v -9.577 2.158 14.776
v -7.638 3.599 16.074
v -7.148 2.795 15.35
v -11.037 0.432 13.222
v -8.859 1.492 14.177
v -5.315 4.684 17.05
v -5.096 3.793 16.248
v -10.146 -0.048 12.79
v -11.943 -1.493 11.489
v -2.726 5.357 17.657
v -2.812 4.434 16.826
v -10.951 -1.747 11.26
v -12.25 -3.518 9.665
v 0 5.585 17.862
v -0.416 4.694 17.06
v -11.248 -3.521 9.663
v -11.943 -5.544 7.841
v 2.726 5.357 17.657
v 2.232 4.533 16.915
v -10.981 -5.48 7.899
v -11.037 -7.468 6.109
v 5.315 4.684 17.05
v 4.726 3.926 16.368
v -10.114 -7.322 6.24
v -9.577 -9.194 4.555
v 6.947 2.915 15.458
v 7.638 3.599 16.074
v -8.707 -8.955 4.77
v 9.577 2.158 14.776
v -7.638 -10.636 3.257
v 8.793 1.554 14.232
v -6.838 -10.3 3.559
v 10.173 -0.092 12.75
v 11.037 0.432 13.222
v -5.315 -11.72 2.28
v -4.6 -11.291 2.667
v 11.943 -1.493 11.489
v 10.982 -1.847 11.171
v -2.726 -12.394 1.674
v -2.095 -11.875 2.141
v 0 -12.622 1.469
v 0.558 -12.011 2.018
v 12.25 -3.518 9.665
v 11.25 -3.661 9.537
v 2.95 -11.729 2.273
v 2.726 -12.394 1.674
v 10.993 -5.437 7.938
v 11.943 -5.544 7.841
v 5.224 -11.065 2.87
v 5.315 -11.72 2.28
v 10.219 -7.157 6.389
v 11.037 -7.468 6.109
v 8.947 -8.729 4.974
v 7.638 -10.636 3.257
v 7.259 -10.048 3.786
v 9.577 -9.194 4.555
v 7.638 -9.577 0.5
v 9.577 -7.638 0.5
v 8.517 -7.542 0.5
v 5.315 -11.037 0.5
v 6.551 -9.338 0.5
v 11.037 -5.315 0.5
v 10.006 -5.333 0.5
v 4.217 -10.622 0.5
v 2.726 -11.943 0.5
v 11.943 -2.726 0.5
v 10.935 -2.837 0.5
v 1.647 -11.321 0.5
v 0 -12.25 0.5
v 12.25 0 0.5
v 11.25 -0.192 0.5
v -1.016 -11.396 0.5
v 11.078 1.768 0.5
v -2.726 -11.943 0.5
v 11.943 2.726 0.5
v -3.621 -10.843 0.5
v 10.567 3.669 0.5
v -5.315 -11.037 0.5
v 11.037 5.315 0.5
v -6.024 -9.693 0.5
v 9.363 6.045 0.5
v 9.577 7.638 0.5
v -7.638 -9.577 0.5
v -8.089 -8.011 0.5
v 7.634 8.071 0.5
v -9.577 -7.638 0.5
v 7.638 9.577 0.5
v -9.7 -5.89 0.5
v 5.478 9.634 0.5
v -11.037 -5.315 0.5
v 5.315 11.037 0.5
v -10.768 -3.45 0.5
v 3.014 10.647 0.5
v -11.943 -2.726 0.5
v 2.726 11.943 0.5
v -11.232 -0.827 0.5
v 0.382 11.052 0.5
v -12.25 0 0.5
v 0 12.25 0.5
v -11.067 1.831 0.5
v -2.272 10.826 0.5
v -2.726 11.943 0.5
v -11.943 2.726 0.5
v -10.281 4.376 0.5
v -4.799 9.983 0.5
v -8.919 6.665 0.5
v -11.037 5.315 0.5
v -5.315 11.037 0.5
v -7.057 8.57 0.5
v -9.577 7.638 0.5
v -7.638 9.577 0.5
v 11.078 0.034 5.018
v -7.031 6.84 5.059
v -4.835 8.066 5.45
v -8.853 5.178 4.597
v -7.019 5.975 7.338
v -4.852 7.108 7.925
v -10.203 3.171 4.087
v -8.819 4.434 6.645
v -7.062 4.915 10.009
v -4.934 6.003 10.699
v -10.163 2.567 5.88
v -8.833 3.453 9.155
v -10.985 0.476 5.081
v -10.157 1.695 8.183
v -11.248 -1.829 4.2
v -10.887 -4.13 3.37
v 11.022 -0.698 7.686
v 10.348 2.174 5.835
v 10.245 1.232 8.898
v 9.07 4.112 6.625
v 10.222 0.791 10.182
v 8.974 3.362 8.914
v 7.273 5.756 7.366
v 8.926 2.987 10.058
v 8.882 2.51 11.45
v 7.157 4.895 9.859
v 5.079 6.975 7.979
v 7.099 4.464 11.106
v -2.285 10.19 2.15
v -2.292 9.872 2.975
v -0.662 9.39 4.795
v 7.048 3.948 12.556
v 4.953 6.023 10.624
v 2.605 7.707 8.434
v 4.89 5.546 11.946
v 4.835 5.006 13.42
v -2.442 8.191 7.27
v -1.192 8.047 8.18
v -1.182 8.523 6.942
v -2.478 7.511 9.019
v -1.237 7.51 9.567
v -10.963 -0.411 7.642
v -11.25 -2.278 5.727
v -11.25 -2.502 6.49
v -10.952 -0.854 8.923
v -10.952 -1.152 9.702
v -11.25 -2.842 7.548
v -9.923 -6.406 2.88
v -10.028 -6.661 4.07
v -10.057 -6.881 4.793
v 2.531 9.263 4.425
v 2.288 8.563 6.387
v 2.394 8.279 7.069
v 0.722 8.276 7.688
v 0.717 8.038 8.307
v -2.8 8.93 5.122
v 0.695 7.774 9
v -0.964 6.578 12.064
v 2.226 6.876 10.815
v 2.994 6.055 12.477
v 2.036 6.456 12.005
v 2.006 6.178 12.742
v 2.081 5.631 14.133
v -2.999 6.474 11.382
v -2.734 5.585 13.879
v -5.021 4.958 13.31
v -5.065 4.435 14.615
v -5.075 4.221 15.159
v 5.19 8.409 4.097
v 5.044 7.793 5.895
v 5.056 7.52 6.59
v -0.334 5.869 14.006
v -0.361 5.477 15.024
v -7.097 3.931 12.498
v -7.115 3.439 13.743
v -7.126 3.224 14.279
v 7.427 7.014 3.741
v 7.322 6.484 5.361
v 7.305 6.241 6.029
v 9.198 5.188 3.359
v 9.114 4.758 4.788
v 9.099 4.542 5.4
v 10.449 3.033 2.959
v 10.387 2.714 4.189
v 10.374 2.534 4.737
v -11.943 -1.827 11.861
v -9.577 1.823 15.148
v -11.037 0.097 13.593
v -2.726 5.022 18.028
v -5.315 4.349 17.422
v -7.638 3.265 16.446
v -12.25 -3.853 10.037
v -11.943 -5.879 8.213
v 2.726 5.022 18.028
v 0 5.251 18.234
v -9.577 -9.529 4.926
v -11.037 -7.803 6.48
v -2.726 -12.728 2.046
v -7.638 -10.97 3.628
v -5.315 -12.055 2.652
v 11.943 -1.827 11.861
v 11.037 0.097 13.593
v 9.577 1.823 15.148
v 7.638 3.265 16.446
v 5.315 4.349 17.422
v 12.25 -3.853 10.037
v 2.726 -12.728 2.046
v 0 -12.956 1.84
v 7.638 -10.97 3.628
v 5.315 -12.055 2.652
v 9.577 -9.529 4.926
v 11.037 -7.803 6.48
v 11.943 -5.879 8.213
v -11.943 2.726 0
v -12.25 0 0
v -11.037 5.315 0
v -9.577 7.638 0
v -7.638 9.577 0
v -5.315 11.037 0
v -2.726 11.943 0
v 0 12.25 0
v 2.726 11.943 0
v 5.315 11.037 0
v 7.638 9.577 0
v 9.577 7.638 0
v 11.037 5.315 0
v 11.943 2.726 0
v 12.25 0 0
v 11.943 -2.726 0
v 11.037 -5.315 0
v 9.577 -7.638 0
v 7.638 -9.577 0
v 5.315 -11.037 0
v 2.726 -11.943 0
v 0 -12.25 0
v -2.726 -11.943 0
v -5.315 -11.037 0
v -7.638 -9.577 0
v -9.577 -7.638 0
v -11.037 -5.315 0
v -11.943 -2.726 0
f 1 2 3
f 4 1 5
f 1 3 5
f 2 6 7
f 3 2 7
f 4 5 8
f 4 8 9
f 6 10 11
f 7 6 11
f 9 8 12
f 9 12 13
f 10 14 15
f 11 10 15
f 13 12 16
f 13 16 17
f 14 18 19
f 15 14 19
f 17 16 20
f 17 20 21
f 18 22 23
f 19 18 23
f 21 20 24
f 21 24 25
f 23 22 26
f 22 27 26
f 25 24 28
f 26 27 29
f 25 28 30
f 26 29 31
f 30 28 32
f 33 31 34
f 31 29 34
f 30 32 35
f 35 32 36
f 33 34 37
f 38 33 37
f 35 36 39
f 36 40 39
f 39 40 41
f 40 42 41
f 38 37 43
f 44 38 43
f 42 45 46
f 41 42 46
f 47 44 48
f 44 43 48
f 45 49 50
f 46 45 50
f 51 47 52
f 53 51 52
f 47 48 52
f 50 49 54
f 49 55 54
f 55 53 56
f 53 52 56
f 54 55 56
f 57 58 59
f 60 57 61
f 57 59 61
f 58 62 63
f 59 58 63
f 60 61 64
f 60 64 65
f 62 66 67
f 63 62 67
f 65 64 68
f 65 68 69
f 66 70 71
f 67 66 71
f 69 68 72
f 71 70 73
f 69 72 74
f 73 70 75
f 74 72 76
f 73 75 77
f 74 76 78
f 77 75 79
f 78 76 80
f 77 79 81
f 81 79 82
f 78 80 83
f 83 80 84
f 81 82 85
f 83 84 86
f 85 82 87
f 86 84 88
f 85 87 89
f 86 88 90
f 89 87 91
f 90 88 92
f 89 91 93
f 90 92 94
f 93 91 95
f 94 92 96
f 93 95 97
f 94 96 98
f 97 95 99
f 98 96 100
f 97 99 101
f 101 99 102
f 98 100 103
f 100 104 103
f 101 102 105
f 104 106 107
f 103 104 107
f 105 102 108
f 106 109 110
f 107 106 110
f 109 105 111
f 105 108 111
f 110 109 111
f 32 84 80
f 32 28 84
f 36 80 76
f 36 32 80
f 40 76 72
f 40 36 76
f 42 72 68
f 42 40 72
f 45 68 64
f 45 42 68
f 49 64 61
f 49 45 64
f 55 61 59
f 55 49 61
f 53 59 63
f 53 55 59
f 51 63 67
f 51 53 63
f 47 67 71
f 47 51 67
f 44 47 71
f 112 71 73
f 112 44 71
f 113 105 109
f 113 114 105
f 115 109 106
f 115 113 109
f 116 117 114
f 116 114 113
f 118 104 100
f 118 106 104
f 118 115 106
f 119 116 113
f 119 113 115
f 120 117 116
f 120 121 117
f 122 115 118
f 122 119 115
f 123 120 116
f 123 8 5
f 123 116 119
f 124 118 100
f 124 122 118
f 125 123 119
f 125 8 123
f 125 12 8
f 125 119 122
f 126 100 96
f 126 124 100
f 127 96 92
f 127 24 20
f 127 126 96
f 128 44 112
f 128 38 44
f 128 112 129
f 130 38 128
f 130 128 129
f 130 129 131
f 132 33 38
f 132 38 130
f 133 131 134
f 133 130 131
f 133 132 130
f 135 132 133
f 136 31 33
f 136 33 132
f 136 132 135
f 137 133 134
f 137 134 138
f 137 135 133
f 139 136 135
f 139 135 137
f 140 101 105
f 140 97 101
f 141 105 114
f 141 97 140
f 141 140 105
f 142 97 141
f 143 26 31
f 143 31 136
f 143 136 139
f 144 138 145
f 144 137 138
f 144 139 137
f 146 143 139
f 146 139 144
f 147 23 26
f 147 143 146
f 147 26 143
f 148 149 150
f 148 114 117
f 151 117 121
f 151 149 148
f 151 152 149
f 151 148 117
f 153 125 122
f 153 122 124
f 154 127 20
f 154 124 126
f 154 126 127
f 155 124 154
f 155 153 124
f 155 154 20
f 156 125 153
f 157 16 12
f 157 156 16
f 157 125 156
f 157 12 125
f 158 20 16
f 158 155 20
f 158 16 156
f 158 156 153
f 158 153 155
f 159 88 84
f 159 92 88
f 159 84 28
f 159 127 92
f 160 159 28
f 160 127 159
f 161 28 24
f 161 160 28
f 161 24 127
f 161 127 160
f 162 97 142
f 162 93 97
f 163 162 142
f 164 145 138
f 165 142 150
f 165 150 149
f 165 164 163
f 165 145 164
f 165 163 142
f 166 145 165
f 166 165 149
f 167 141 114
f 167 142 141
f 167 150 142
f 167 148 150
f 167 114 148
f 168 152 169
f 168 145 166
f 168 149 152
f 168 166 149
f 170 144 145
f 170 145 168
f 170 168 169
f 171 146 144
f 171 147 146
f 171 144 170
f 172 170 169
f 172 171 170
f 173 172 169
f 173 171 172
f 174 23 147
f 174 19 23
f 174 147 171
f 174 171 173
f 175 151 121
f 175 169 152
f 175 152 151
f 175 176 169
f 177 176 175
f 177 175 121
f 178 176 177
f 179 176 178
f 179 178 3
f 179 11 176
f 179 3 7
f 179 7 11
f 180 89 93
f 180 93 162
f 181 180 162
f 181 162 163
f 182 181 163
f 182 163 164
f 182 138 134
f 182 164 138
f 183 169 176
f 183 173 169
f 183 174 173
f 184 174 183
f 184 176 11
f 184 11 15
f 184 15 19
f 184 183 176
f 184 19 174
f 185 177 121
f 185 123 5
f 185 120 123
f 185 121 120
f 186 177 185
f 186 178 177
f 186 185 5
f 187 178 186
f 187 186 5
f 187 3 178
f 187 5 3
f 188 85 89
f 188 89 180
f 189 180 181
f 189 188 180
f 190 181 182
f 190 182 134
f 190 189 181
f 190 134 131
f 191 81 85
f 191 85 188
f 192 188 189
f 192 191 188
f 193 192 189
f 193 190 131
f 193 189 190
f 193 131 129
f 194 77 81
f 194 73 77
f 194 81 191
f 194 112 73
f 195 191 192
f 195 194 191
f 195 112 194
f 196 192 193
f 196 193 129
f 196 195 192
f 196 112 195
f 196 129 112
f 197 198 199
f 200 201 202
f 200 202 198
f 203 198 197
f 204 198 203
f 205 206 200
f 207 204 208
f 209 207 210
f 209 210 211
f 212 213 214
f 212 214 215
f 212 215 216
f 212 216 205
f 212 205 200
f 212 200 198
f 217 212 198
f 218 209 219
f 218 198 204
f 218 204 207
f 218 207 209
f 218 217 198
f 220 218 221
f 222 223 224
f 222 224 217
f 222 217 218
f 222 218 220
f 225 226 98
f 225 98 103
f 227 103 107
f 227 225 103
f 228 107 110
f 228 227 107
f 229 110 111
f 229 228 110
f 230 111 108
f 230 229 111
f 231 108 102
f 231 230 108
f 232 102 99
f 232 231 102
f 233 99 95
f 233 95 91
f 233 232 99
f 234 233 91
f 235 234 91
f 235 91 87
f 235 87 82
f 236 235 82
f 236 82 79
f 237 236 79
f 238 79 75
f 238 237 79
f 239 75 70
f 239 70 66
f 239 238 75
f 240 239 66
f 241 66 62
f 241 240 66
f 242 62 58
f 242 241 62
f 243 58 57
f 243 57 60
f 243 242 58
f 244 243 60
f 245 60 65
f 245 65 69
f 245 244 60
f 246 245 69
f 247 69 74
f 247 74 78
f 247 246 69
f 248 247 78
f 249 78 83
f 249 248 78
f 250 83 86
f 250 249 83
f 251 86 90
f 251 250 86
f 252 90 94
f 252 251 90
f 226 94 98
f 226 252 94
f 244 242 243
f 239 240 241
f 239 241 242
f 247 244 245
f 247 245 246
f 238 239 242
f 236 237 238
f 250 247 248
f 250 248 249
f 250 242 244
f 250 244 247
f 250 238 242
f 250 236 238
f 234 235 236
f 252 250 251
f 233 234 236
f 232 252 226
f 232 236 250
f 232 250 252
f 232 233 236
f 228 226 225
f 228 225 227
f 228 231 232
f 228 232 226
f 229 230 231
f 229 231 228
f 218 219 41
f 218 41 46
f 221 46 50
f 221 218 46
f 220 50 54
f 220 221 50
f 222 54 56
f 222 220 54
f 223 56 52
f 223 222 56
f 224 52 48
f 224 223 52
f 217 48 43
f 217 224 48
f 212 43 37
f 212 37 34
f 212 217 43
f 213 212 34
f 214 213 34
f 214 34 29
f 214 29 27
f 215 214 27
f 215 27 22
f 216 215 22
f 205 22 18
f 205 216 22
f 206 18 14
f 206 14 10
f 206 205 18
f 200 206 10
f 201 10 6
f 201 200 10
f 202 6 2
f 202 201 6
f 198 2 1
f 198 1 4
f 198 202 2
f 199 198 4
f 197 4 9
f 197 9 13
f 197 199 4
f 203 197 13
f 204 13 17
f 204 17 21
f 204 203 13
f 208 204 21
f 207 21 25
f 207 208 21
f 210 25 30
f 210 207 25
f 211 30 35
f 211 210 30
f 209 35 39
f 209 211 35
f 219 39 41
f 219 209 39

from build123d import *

# Parameters (mm, degrees)
SKETCH1_R           = 11.25
SKETCH11_R          = 12.25
BOSS_EXTRUDE2_DEPTH = 0.5
SKETCH9_R           = 12.25
BOSS_EXTRUDE3_DEPTH = 0.5


with BuildPart() as part:
    # Sweep1: sweep along a path in Sketch3
    with BuildLine(Plane(origin=(0, 0, 0), x_dir=(0, 0, -1), z_dir=(1, 0, 0))) as sweep1_path:
        Line((0, 0), (-23.339510662, -8.959198739))
    # Sketch1 → Sweep1 (sweep)
    with BuildSketch(Plane.XY):
        Circle(SKETCH1_R)
    sweep(path=sweep1_path.line)

    # SurfaceCut3
    split(bisect_by=Plane(origin=(0, -6.716036525, 7.458914215), x_dir=(1, 0, 0), z_dir=(0, -0.6691306063588593, 0.7431448254773932)), keep=Keep.BOTTOM)

    # Sketch11 → Boss-Extrude2 (add)
    with BuildSketch(Plane(origin=(0, -6.716036525, 7.458914215), x_dir=(1, 0, 0), z_dir=(0, -0.6691306063588595, 0.7431448254773932))):
        with Locations(Location((0, 3.852827618, 0), (0, 0, 270))):
            Circle(SKETCH11_R)
    extrude(amount=-BOSS_EXTRUDE2_DEPTH)

    # Sketch9 → Boss-Extrude3 (add)
    with BuildSketch(Plane(origin=(0, 0, 0), x_dir=(-1, 0, 0), z_dir=(0, 0, -1))):
        Circle(SKETCH9_R)
    extrude(amount=-BOSS_EXTRUDE3_DEPTH)


solid = part.part
